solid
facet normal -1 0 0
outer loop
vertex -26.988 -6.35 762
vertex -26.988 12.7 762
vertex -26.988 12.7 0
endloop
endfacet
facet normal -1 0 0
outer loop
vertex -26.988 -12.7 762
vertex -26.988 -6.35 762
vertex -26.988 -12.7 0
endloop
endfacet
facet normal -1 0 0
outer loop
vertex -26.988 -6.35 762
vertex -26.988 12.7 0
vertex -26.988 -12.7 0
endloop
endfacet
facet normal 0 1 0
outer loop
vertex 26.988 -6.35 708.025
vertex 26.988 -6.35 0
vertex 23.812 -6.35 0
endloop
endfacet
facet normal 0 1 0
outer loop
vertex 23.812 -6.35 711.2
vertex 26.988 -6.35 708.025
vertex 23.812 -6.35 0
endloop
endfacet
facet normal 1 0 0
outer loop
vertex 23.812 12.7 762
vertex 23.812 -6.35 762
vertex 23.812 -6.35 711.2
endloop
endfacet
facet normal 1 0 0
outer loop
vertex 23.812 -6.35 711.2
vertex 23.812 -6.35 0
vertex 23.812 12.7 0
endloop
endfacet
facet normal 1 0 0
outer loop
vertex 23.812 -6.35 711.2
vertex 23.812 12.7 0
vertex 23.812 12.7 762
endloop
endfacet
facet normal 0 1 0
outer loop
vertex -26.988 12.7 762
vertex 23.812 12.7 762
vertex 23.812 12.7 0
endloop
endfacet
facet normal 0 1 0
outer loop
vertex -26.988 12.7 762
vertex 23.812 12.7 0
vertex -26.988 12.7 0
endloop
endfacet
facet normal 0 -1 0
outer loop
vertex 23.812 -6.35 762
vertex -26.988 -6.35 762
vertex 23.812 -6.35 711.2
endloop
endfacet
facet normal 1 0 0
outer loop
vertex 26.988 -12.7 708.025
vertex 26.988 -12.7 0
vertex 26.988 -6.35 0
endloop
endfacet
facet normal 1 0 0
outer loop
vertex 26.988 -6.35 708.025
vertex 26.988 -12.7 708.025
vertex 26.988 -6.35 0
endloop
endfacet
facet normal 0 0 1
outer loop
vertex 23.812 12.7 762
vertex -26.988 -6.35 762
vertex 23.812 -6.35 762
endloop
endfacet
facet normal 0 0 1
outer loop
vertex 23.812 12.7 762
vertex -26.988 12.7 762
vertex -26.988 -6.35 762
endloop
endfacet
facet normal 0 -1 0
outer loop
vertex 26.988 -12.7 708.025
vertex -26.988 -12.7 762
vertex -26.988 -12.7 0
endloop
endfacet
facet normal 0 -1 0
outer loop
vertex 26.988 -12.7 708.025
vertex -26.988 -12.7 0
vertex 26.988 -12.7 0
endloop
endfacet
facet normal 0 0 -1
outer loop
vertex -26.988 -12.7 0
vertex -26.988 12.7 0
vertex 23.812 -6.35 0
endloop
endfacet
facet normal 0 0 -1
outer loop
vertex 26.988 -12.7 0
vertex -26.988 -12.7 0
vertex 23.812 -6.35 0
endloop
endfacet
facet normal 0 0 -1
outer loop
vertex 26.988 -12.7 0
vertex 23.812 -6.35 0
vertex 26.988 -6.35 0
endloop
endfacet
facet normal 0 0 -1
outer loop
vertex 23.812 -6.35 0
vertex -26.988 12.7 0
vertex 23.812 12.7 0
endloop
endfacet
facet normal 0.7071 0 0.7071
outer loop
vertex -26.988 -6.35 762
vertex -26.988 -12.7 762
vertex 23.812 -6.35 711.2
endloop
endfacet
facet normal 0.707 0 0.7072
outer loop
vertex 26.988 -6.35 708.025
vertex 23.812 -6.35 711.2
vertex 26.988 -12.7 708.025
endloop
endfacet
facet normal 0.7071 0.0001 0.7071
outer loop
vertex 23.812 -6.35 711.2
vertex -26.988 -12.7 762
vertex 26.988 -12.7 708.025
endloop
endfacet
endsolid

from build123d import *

# Parameters (mm, degrees)
F1_DEPTH = 762
F3_DEPTH = 6.35


with BuildPart() as f1:
    # F0 (on Top) → F1 (new body)
    with BuildSketch(Plane.XY):
        Polygon((23.8125, -6.35), (23.8125, 12.7), (-26.9875, 12.7), (-26.9875, -12.7), (26.9875, -12.7), (26.9875, -6.35), align=None)
    extrude(amount=F1_DEPTH)

    # F2 (on face) → F3 (cut)
    with BuildSketch(Plane.XZ.offset(12.7)):
        Polygon((26.9875, 762), (-26.9875, 762), (26.9875, 708.025), align=None)
    extrude(amount=-F3_DEPTH, mode=Mode.SUBTRACT)


solid = f1.part
